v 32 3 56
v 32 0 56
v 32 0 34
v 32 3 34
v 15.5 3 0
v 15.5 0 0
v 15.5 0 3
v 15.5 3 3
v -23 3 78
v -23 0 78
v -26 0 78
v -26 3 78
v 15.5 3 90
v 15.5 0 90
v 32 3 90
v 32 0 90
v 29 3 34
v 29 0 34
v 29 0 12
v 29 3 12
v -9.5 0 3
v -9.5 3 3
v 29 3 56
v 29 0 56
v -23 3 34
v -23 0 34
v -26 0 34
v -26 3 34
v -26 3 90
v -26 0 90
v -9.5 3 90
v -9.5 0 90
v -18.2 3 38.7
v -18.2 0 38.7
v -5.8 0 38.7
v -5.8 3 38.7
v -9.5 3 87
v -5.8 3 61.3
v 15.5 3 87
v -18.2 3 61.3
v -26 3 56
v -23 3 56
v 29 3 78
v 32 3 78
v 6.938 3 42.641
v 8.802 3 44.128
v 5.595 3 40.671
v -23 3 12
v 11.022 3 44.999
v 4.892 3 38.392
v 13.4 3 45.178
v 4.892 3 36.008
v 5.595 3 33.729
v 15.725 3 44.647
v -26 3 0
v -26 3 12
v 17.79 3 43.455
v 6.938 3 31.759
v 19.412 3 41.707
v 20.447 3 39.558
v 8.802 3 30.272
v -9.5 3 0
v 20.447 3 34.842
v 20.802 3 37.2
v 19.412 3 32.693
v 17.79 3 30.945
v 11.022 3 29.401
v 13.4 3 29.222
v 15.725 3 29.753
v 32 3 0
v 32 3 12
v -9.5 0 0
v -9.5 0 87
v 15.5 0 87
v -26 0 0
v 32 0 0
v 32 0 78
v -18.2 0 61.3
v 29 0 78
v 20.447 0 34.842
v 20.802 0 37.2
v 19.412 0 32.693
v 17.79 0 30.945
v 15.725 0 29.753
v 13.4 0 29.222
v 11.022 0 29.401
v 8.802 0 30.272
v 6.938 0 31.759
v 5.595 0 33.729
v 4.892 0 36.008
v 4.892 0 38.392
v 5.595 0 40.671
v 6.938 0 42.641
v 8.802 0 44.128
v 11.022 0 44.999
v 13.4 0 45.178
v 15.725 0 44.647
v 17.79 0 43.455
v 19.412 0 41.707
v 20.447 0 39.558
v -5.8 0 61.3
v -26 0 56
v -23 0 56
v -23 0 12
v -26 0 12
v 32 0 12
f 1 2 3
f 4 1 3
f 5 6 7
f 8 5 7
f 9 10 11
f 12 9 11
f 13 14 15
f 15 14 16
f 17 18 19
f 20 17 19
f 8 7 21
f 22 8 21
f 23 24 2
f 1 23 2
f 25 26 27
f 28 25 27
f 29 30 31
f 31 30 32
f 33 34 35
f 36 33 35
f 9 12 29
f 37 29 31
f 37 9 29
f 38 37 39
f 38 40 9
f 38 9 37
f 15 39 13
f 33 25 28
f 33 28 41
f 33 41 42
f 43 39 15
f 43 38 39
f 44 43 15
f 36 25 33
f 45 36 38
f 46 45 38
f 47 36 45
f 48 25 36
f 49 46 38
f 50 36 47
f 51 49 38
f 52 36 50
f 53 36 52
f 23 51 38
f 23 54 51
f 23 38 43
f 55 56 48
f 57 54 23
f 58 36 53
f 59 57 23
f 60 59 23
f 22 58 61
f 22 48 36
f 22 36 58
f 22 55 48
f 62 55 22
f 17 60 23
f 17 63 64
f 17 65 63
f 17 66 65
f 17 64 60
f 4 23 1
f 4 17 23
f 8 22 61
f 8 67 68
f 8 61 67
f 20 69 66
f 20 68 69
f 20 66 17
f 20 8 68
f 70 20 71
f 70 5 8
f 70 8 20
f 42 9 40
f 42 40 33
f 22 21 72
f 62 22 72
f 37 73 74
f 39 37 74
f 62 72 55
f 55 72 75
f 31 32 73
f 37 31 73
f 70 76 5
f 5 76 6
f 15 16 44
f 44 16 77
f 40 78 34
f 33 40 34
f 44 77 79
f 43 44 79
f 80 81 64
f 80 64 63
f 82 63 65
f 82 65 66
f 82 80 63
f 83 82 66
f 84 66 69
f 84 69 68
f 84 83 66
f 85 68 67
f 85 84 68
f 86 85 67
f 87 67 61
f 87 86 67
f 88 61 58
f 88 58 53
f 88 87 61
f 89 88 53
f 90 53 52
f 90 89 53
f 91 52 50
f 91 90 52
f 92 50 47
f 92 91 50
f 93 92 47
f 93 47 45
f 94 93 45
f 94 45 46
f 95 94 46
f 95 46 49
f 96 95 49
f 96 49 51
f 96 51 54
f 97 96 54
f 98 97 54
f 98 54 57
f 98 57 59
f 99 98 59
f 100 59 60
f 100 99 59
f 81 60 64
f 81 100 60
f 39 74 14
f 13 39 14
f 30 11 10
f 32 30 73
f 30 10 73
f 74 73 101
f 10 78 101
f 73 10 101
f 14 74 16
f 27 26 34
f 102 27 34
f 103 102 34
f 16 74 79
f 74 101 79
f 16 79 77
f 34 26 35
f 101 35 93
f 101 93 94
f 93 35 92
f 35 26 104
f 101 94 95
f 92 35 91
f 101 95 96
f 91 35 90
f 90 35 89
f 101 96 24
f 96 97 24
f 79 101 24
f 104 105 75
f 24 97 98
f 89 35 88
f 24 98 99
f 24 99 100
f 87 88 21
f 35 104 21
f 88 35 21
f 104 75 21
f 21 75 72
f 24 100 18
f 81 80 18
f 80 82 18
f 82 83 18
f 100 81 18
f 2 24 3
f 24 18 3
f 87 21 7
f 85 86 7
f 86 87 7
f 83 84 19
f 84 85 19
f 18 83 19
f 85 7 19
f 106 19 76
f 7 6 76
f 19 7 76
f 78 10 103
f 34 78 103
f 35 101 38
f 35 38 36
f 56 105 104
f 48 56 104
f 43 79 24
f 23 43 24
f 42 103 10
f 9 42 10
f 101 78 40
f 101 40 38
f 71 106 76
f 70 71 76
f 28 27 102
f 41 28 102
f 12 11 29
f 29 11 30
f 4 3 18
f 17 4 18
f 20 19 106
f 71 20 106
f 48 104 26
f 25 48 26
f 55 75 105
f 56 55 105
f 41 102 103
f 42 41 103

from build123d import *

# Parameters (mm, degrees)
SKETCH4_R           = 8
SKETCH4_W           = 12.4
SKETCH4_H           = 22.6
BOSS_EXTRUDE2_DEPTH = 3


with BuildPart() as part:
    # Sketch4 → Boss-Extrude2 (new body)
    with BuildSketch(Plane(origin=(0, 0, 0), x_dir=(1, 0, 0), z_dir=(0, 1, 0))):
        Polygon((-26, -90), (-9.5, -90), (-9.5, -87), (15.5, -87), (15.5, -90), (32, -90), (32, -78), (29, -78), (29, -56), (32, -56), (32, -34), (29, -34), (29, -12), (32, -12), (32, 0), (15.5, 0), (15.5, -3), (-9.5, -3), (-9.5, 0), (-26, 0), (-26, -12), (-23, -12), (-23, -34), (-26, -34), (-26, -56), (-23, -56), (-23, -78), (-26, -78), align=None)
        with Locations((12.802419237, -37.2)):
            Circle(SKETCH4_R, mode=Mode.SUBTRACT)
        with Locations((-12, -50)):
            Rectangle(SKETCH4_W, SKETCH4_H, mode=Mode.SUBTRACT)
    extrude(amount=BOSS_EXTRUDE2_DEPTH)


solid = part.part
